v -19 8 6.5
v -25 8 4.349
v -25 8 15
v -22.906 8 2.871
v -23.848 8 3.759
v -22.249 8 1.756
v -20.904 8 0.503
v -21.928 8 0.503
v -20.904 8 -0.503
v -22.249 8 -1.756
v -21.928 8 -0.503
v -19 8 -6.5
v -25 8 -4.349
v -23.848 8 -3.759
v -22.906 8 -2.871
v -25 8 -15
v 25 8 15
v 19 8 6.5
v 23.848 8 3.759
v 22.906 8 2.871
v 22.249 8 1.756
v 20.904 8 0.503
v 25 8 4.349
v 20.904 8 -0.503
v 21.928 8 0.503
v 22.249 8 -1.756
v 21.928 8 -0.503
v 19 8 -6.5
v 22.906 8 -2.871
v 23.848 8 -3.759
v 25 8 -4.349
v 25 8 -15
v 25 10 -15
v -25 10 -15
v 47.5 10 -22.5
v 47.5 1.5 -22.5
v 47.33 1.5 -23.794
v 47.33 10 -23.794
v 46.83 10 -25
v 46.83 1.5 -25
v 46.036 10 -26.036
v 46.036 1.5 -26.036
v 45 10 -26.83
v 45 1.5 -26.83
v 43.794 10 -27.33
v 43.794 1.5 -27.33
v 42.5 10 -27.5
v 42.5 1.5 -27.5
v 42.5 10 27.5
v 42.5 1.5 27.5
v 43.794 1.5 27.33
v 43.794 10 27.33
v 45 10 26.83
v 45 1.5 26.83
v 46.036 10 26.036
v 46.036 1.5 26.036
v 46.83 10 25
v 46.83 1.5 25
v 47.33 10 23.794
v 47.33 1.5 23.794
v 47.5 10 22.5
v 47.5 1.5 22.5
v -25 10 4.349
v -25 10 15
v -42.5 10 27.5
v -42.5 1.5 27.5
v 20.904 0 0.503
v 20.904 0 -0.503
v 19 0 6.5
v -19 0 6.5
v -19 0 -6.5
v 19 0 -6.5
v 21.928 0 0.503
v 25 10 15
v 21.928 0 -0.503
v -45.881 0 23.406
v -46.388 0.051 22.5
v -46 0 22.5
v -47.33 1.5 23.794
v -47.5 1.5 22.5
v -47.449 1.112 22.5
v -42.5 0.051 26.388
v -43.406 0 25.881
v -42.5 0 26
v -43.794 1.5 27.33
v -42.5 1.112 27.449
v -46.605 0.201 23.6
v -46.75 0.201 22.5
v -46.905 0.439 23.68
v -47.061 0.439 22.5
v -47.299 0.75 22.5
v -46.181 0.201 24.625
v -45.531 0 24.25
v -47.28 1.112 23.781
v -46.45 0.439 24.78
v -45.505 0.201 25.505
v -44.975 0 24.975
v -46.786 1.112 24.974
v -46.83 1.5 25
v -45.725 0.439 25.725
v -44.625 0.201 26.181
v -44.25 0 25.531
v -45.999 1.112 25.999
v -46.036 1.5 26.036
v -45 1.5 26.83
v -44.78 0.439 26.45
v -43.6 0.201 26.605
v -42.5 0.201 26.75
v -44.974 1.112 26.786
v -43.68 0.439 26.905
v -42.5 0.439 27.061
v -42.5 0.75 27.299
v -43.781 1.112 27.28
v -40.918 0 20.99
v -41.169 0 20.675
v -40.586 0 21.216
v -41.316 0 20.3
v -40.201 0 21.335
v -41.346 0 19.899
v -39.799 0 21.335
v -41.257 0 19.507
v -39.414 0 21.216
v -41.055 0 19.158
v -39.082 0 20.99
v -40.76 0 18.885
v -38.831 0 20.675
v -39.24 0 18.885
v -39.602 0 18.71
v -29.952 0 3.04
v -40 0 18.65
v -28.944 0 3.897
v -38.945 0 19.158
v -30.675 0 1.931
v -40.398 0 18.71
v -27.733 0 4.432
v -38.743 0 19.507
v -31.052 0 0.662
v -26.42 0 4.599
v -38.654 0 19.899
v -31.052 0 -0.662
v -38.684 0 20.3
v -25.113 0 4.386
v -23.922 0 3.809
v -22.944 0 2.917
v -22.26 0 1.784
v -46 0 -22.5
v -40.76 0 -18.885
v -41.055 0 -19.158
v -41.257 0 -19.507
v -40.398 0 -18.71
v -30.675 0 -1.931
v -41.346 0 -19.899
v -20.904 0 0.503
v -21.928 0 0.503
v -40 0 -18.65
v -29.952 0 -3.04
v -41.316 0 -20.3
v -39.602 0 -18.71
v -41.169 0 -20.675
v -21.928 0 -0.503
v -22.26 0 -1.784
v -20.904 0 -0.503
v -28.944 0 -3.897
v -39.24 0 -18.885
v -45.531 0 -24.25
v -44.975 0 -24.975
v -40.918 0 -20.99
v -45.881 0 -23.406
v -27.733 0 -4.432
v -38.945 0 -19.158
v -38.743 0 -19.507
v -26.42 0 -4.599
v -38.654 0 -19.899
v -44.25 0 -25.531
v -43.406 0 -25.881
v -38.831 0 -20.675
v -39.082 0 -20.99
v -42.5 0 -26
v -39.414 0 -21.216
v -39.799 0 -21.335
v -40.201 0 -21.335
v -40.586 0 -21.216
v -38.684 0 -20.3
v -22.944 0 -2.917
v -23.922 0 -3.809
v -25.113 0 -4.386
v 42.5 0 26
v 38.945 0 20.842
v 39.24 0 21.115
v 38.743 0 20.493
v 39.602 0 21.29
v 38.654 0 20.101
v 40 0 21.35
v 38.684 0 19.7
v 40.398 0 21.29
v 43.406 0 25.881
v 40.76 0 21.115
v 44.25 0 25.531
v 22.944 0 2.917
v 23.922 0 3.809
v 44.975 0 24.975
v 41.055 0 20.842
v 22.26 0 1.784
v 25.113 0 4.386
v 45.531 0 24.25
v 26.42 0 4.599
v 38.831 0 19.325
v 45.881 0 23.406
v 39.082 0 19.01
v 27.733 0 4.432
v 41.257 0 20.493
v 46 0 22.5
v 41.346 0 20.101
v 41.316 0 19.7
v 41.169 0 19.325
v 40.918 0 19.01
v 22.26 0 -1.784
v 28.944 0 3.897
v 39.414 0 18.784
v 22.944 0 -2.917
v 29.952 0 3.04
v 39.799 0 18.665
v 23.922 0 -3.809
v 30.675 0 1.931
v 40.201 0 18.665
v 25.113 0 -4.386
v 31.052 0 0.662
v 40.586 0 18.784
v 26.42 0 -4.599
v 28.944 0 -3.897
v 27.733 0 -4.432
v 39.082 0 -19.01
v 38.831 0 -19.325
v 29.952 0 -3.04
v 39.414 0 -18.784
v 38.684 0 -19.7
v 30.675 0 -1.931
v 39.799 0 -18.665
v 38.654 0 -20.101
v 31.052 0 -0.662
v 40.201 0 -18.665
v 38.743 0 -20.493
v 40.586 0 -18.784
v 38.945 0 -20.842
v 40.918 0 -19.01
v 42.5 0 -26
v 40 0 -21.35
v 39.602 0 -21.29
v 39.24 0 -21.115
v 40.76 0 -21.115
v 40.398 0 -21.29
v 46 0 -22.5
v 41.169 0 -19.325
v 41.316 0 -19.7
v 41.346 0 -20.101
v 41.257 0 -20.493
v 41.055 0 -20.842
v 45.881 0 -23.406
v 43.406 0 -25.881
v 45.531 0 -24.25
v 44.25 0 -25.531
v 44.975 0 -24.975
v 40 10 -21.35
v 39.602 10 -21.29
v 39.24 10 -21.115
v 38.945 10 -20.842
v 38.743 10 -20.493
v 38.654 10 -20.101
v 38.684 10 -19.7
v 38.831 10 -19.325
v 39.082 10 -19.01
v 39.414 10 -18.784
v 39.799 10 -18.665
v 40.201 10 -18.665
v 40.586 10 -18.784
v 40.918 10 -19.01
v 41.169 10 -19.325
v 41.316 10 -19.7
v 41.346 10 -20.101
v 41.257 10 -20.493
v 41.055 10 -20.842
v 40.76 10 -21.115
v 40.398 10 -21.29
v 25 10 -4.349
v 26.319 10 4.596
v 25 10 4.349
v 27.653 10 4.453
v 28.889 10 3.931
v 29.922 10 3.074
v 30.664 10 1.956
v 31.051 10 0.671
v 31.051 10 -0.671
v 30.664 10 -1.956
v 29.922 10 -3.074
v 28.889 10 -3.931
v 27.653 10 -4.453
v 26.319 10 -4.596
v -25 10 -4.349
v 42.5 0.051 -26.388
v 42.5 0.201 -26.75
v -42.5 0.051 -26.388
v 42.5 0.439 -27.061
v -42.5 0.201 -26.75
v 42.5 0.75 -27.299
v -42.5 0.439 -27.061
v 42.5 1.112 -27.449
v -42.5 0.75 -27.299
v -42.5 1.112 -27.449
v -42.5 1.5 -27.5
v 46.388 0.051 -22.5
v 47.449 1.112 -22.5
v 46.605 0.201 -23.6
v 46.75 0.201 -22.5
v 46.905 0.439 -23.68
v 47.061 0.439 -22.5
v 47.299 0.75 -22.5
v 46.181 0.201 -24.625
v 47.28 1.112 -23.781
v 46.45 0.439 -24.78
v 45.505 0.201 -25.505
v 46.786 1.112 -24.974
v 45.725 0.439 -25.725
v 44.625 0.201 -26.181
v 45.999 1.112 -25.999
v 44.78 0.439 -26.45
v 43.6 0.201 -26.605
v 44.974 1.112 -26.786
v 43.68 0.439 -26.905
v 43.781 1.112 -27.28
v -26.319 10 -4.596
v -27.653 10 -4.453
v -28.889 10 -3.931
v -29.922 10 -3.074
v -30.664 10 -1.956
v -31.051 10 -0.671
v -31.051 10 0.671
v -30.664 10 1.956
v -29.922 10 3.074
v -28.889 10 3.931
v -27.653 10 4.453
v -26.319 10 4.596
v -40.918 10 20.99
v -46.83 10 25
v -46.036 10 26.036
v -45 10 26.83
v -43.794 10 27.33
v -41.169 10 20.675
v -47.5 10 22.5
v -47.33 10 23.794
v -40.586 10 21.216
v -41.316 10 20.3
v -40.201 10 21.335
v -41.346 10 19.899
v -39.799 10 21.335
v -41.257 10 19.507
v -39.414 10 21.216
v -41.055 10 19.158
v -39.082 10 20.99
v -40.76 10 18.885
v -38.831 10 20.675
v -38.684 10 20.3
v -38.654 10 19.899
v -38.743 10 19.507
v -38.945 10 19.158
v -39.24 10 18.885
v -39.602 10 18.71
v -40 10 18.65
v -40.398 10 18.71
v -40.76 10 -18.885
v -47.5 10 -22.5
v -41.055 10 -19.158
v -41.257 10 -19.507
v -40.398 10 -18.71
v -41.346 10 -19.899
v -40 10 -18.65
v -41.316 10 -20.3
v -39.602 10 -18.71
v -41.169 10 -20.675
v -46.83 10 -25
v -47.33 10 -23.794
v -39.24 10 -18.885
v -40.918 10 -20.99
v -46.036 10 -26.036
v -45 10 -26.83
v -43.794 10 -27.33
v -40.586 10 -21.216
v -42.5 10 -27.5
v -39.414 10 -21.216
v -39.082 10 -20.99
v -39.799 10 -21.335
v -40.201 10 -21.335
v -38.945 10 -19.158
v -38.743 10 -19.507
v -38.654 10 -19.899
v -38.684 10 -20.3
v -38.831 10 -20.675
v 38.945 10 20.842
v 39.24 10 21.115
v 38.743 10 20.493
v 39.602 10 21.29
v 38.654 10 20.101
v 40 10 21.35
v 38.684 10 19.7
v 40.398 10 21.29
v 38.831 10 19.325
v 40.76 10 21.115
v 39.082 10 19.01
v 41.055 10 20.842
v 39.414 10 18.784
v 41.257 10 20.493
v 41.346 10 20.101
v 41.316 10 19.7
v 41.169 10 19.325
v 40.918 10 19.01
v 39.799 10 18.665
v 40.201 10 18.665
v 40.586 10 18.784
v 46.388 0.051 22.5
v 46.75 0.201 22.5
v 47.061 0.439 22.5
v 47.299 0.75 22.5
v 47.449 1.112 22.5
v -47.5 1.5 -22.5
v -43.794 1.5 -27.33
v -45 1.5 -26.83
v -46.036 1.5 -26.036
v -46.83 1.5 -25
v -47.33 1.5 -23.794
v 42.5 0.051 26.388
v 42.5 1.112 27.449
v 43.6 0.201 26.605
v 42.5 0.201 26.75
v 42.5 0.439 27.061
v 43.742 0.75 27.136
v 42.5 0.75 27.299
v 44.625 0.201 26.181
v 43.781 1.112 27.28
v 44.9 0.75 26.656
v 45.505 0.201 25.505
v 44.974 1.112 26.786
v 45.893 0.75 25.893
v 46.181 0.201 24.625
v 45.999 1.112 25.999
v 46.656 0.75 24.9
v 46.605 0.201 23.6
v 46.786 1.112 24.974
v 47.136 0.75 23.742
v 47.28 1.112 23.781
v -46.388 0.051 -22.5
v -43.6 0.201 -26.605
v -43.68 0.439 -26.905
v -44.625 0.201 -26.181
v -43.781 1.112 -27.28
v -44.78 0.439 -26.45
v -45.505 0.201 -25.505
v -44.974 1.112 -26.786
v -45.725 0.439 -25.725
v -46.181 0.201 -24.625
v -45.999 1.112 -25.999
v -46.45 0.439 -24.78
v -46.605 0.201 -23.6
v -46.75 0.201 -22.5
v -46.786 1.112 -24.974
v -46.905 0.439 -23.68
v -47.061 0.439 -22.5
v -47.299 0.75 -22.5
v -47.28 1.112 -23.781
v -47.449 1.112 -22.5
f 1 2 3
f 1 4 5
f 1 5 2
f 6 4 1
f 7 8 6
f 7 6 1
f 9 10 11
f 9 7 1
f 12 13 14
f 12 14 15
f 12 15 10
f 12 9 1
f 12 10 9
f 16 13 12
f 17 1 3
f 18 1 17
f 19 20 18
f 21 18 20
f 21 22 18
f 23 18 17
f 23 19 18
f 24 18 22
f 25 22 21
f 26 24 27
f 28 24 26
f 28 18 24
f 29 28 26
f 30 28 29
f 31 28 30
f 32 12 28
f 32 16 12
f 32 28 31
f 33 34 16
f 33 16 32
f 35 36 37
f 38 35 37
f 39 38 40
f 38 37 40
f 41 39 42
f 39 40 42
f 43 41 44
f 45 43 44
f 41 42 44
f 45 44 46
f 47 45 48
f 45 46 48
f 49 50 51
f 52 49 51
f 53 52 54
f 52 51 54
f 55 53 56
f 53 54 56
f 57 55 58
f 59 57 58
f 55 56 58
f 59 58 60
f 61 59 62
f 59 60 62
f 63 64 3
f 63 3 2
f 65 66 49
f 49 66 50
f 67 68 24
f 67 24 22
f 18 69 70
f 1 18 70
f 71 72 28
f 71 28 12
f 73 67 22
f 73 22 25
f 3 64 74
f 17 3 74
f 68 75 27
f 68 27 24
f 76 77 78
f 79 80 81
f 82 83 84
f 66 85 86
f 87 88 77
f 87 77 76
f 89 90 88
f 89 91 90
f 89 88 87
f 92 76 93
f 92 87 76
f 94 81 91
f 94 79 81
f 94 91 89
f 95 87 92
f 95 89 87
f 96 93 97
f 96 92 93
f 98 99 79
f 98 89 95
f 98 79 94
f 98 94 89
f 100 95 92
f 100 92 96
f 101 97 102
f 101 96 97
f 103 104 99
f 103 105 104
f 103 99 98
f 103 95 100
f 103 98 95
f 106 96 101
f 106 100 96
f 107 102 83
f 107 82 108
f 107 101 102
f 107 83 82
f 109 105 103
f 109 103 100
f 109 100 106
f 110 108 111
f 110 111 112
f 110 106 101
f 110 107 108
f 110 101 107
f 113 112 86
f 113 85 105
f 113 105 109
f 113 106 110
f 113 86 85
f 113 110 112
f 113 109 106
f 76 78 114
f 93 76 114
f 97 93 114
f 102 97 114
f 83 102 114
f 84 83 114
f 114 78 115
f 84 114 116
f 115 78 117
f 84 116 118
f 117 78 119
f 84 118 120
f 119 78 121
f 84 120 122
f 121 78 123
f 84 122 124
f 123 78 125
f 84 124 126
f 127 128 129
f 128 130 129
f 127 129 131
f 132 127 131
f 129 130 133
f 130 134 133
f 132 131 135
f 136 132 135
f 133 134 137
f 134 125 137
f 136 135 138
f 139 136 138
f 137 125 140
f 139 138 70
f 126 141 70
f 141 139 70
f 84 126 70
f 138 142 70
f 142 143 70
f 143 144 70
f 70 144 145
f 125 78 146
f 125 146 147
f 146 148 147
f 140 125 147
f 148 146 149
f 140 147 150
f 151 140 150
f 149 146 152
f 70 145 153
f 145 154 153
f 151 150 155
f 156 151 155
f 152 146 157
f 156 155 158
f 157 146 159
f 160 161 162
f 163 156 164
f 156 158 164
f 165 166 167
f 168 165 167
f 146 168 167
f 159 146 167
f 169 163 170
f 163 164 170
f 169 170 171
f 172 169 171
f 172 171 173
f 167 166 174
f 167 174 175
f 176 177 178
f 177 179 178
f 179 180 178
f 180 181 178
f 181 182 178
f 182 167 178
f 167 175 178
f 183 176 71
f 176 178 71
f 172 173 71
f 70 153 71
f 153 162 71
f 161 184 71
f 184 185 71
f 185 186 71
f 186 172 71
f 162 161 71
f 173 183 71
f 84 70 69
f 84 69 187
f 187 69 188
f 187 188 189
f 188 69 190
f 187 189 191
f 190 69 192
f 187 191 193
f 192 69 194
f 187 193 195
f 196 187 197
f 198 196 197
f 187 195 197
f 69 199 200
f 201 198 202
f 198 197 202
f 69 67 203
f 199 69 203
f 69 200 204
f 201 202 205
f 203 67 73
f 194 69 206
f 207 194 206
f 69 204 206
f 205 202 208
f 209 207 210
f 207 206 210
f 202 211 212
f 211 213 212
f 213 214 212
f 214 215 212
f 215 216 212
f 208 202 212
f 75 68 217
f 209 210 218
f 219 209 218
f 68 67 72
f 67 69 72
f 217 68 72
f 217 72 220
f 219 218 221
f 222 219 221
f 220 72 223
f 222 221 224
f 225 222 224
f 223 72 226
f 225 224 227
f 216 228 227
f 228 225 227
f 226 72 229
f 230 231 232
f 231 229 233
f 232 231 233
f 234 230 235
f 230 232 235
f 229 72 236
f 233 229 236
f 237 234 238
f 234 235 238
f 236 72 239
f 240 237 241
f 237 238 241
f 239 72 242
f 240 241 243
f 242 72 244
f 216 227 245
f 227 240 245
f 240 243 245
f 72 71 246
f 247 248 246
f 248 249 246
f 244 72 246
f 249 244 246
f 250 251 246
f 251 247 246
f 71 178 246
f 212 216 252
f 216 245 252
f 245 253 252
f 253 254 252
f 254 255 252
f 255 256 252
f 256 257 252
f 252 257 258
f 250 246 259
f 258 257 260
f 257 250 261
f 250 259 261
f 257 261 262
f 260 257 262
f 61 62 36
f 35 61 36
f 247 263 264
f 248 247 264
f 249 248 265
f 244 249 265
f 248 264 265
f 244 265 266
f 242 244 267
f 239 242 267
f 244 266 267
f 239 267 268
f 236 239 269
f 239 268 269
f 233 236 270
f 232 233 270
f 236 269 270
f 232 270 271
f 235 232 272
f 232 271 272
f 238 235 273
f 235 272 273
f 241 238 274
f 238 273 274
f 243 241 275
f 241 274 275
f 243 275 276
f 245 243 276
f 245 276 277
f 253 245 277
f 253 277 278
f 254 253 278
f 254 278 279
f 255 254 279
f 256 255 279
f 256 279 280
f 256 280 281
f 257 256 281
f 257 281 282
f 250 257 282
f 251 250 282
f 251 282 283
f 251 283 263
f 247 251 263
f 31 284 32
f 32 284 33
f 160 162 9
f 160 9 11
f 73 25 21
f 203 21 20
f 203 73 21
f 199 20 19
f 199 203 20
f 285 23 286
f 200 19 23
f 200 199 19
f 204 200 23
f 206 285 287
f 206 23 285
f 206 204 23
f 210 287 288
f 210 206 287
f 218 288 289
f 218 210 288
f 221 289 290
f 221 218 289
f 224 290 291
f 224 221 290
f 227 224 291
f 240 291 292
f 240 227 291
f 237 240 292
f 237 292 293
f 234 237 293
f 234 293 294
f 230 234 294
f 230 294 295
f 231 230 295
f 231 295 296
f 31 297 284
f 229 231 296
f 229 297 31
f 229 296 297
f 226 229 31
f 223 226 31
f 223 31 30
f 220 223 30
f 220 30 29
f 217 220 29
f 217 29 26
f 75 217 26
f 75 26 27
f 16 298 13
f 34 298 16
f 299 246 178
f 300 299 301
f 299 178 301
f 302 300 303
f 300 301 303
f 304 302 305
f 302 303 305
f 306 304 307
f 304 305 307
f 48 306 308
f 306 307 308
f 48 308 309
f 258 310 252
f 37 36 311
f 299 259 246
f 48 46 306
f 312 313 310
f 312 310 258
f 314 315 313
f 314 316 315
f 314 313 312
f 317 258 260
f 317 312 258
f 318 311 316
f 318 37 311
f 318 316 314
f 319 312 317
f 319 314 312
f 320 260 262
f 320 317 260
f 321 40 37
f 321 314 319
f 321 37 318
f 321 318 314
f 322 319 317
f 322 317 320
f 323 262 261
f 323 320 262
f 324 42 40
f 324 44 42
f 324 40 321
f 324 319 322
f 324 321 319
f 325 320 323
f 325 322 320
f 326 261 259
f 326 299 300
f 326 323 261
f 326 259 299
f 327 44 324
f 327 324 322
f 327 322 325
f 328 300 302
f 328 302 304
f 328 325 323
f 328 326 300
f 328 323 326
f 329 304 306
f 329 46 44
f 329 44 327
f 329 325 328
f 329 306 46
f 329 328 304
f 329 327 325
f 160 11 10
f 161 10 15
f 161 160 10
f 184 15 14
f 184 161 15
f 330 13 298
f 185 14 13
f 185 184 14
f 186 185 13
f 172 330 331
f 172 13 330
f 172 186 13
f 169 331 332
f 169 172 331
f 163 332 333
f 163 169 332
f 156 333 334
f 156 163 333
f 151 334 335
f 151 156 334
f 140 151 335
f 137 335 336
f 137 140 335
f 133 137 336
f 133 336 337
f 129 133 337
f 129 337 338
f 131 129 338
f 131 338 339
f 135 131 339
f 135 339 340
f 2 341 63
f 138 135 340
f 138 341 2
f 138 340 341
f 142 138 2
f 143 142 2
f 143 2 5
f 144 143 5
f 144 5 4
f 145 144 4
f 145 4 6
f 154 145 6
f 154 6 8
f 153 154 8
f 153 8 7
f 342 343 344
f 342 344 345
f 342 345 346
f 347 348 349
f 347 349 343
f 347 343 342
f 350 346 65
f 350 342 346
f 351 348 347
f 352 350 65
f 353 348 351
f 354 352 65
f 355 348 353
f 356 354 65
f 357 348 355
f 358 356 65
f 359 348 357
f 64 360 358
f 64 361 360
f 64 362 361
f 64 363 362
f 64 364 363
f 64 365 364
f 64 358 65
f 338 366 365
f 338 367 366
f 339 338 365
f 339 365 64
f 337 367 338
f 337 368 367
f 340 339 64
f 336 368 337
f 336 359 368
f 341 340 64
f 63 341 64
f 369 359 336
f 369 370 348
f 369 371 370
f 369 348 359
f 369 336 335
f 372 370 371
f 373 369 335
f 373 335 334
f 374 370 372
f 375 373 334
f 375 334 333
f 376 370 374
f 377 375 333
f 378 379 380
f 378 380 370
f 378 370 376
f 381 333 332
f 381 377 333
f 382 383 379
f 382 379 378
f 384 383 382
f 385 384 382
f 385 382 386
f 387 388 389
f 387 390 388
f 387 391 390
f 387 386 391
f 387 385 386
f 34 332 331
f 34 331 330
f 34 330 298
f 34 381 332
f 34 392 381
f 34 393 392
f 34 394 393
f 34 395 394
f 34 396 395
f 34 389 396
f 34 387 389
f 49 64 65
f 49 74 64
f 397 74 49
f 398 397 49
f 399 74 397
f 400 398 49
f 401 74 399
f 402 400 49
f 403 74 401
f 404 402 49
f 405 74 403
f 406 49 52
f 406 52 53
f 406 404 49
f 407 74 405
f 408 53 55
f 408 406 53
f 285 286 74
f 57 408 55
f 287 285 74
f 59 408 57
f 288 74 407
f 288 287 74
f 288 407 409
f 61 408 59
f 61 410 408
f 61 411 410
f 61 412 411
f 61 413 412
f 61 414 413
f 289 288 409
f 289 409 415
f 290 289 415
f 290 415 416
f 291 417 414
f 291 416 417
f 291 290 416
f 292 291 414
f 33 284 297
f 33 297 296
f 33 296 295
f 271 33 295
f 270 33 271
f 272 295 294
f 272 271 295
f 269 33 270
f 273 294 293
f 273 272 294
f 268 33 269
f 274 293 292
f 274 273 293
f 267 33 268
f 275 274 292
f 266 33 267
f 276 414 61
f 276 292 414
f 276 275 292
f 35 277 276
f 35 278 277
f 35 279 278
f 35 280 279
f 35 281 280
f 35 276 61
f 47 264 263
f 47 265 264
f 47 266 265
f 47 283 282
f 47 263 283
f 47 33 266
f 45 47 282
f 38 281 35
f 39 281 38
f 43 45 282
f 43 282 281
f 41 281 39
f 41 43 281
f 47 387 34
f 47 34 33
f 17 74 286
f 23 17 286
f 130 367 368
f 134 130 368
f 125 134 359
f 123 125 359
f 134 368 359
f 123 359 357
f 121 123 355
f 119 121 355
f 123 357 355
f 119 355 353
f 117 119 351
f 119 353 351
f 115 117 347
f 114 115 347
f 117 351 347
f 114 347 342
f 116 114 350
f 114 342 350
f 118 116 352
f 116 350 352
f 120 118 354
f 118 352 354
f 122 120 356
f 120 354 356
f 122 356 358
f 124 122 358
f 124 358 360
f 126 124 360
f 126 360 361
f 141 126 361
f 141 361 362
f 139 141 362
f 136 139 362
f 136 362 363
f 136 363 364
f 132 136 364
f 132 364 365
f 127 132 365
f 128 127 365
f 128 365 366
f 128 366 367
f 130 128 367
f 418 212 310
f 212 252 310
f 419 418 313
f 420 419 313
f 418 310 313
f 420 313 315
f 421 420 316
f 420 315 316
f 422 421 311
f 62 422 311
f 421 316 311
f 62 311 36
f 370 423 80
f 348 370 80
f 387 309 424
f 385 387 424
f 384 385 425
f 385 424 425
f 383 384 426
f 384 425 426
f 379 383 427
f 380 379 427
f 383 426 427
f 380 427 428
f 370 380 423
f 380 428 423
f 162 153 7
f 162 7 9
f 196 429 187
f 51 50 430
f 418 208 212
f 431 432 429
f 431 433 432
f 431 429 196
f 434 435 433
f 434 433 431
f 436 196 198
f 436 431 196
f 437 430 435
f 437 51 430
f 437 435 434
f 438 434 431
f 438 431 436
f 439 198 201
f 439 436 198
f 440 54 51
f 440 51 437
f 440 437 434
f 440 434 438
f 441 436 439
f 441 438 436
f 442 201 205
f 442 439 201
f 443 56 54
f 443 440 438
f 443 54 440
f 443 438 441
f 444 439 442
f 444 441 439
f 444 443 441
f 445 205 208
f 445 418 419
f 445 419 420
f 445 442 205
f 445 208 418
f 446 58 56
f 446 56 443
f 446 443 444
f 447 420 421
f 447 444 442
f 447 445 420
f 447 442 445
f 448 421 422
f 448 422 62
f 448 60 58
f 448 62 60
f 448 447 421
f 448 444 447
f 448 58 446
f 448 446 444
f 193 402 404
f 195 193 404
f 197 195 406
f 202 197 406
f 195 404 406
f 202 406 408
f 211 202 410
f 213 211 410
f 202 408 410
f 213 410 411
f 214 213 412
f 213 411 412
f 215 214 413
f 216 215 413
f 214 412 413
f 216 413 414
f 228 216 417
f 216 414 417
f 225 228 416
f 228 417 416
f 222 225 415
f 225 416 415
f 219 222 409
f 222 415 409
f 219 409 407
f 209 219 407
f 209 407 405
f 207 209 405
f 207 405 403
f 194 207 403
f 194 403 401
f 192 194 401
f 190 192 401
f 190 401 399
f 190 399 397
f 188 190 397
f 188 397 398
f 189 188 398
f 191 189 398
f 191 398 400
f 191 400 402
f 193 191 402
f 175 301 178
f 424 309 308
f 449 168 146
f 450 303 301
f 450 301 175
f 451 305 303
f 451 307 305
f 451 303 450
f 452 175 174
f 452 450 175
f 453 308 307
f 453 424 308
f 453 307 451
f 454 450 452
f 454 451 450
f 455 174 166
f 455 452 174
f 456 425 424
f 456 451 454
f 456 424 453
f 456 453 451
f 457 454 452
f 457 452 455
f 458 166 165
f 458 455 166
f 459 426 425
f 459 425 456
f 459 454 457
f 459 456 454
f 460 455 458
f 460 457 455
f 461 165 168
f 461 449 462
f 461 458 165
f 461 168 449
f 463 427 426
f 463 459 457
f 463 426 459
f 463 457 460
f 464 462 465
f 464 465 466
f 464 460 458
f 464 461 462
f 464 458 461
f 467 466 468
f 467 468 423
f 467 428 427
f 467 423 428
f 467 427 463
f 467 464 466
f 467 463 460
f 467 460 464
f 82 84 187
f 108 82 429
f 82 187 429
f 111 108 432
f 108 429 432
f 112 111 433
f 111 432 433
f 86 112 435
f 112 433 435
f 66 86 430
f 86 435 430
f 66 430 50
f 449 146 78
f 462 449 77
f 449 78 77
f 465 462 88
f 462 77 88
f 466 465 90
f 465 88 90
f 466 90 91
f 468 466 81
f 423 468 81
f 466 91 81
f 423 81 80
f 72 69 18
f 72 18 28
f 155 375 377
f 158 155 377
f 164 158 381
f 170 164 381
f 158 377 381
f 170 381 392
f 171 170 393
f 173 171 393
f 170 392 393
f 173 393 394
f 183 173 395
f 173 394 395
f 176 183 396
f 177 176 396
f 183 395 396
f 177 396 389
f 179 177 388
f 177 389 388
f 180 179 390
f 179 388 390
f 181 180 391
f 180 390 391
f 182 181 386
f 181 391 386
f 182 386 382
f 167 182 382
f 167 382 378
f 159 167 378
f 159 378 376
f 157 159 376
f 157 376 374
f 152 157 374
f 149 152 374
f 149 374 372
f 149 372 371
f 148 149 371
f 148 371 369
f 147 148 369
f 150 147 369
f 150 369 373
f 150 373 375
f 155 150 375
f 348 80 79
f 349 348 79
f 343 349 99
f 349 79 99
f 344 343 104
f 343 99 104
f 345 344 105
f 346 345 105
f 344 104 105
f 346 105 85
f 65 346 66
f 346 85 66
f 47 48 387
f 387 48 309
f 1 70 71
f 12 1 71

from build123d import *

# Parameters (mm, degrees)
BOSS_EXTRUDE1_DEPTH = 10
SKETCH2_R           = 1.35
CUT_EXTRUDE2_DEPTH  = 56.789784011
FILLET4_R           = 1.5
SKETCH4_W           = 38
SKETCH4_H           = 13
CUT_EXTRUDE3_DEPTH  = 56.789784011
SKETCH5_W           = 50
SKETCH5_H           = 30
CUT_EXTRUDE5_DEPTH  = 2


with BuildPart() as part:
    # Sketch1 → Boss-Extrude1 (new body)
    with BuildSketch(Plane(origin=(0, 0, 0), x_dir=(1, 0, 0), z_dir=(0, 1, 0))):
        with BuildLine():
            Line((-42.5, -27.5), (42.5, -27.5))
            ThreePointArc((42.5, -27.5), (46.035533906, -26.035533906), (47.5, -22.5))
            Line((47.5, -22.5), (47.5, 22.5))
            ThreePointArc((47.5, 22.5), (46.035533906, 26.035533906), (42.5, 27.5))
            Line((42.5, 27.5), (-42.5, 27.5))
            ThreePointArc((-42.5, 27.5), (-46.035533906, 26.035533906), (-47.5, 22.5))
            Line((-47.5, 22.5), (-47.5, -22.5))
            ThreePointArc((-47.5, -22.5), (-46.035533906, -26.035533906), (-42.5, -27.5))
        make_face()
    extrude(amount=BOSS_EXTRUDE1_DEPTH)

    # Sketch2 → Cut-Extrude2 (cut, through all)
    with BuildSketch(Plane(origin=(0, 10, 0), x_dir=(1, 0, 0), z_dir=(0, 1, 0))):
        with Locations((-40, 20)):
            Circle(SKETCH2_R)
        with Locations((-40, -20)):
            Circle(SKETCH2_R)
        with Locations((40, -20)):
            Circle(SKETCH2_R)
        with Locations((40, 20)):
            Circle(SKETCH2_R)
    extrude(amount=-CUT_EXTRUDE2_DEPTH, mode=Mode.SUBTRACT)

    # Fillet4
    fillet4_edges = [part.edges().sort_by_distance(p)[0] for p in [
        (47.5, 0, 0),
        (0, 0, -27.5),
        (0, 0, 27.5),
        (-47.5, 0, 0),
        (-46.035533906, 0, -26.035533906),
        (46.035533906, 0, -26.035533906),
        (46.035533906, 0, 26.035533906),
        (-46.035533906, 0, 26.035533906),
    ]]
    fillet(fillet4_edges, radius=FILLET4_R)

    # Sketch4 → Cut-Extrude3 (cut, through all)
    with BuildSketch(Plane(origin=(0, 0, 0), x_dir=(-1, 0, 0), z_dir=(0, -1, 0))):
        Rectangle(SKETCH4_W, SKETCH4_H)
        with BuildLine():
            Line((20.903728907, -0.502566941), (20.903728907, 0.502566941))
            Line((20.903728907, 0.502566941), (21.927536061, 0.502566941))
            ThreePointArc((21.927536061, 0.502566941), (31.1, 0), (21.927536061, -0.502566941))
            Line((21.927536061, -0.502566941), (20.903728907, -0.502566941))
        make_face()
        with BuildLine():
            Line((-20.903728907, -0.502566941), (-21.927536061, -0.502566941))
            ThreePointArc((-21.927536061, -0.502566941), (-31.1, 0), (-21.927536061, 0.502566941))
            Line((-21.927536061, 0.502566941), (-20.903728907, 0.502566941))
            Line((-20.903728907, 0.502566941), (-20.903728907, -0.502566941))
        make_face()
    extrude(amount=-CUT_EXTRUDE3_DEPTH, mode=Mode.SUBTRACT)

    # Sketch5 → Cut-Extrude5 (cut)
    with BuildSketch(Plane(origin=(0, 10, 0), x_dir=(1, 0, 0), z_dir=(0, 1, 0))):
        Rectangle(SKETCH5_W, SKETCH5_H)
    extrude(amount=-CUT_EXTRUDE5_DEPTH, mode=Mode.SUBTRACT)


solid = part.part
